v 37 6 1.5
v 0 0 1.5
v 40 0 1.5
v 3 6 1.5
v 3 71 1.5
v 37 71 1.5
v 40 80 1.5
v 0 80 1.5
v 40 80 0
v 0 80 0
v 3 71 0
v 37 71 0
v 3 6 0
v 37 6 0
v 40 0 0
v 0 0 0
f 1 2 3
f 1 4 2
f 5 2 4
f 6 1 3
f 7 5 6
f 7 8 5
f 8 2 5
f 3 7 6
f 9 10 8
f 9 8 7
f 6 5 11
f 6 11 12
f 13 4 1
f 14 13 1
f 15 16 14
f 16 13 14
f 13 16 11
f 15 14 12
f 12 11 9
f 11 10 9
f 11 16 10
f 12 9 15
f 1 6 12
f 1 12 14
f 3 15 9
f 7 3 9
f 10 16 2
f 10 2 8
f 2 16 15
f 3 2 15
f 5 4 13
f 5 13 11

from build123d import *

# Parameters (mm, degrees)
SKETCH1_W           = 40
SKETCH1_H           = 80
BOSS_EXTRUDE1_DEPTH = 1.5
CUT_EXTRUDE1_DEPTH  = 1.5


with BuildPart() as part:
    # Sketch1 → Boss-Extrude1 (new body)
    with BuildSketch(Plane.XY):
        with Locations((20, 40)):
            Rectangle(SKETCH1_W, SKETCH1_H)
    extrude(amount=BOSS_EXTRUDE1_DEPTH)

    # Sketch2 → Cut-Extrude1 (cut)
    with BuildSketch(Plane.XY.offset(1.5)):
        Polygon((37, 71), (37, 6), (20, 6), (3, 6), (3, 71), align=None)
    extrude(amount=-CUT_EXTRUDE1_DEPTH, mode=Mode.SUBTRACT)


solid = part.part
